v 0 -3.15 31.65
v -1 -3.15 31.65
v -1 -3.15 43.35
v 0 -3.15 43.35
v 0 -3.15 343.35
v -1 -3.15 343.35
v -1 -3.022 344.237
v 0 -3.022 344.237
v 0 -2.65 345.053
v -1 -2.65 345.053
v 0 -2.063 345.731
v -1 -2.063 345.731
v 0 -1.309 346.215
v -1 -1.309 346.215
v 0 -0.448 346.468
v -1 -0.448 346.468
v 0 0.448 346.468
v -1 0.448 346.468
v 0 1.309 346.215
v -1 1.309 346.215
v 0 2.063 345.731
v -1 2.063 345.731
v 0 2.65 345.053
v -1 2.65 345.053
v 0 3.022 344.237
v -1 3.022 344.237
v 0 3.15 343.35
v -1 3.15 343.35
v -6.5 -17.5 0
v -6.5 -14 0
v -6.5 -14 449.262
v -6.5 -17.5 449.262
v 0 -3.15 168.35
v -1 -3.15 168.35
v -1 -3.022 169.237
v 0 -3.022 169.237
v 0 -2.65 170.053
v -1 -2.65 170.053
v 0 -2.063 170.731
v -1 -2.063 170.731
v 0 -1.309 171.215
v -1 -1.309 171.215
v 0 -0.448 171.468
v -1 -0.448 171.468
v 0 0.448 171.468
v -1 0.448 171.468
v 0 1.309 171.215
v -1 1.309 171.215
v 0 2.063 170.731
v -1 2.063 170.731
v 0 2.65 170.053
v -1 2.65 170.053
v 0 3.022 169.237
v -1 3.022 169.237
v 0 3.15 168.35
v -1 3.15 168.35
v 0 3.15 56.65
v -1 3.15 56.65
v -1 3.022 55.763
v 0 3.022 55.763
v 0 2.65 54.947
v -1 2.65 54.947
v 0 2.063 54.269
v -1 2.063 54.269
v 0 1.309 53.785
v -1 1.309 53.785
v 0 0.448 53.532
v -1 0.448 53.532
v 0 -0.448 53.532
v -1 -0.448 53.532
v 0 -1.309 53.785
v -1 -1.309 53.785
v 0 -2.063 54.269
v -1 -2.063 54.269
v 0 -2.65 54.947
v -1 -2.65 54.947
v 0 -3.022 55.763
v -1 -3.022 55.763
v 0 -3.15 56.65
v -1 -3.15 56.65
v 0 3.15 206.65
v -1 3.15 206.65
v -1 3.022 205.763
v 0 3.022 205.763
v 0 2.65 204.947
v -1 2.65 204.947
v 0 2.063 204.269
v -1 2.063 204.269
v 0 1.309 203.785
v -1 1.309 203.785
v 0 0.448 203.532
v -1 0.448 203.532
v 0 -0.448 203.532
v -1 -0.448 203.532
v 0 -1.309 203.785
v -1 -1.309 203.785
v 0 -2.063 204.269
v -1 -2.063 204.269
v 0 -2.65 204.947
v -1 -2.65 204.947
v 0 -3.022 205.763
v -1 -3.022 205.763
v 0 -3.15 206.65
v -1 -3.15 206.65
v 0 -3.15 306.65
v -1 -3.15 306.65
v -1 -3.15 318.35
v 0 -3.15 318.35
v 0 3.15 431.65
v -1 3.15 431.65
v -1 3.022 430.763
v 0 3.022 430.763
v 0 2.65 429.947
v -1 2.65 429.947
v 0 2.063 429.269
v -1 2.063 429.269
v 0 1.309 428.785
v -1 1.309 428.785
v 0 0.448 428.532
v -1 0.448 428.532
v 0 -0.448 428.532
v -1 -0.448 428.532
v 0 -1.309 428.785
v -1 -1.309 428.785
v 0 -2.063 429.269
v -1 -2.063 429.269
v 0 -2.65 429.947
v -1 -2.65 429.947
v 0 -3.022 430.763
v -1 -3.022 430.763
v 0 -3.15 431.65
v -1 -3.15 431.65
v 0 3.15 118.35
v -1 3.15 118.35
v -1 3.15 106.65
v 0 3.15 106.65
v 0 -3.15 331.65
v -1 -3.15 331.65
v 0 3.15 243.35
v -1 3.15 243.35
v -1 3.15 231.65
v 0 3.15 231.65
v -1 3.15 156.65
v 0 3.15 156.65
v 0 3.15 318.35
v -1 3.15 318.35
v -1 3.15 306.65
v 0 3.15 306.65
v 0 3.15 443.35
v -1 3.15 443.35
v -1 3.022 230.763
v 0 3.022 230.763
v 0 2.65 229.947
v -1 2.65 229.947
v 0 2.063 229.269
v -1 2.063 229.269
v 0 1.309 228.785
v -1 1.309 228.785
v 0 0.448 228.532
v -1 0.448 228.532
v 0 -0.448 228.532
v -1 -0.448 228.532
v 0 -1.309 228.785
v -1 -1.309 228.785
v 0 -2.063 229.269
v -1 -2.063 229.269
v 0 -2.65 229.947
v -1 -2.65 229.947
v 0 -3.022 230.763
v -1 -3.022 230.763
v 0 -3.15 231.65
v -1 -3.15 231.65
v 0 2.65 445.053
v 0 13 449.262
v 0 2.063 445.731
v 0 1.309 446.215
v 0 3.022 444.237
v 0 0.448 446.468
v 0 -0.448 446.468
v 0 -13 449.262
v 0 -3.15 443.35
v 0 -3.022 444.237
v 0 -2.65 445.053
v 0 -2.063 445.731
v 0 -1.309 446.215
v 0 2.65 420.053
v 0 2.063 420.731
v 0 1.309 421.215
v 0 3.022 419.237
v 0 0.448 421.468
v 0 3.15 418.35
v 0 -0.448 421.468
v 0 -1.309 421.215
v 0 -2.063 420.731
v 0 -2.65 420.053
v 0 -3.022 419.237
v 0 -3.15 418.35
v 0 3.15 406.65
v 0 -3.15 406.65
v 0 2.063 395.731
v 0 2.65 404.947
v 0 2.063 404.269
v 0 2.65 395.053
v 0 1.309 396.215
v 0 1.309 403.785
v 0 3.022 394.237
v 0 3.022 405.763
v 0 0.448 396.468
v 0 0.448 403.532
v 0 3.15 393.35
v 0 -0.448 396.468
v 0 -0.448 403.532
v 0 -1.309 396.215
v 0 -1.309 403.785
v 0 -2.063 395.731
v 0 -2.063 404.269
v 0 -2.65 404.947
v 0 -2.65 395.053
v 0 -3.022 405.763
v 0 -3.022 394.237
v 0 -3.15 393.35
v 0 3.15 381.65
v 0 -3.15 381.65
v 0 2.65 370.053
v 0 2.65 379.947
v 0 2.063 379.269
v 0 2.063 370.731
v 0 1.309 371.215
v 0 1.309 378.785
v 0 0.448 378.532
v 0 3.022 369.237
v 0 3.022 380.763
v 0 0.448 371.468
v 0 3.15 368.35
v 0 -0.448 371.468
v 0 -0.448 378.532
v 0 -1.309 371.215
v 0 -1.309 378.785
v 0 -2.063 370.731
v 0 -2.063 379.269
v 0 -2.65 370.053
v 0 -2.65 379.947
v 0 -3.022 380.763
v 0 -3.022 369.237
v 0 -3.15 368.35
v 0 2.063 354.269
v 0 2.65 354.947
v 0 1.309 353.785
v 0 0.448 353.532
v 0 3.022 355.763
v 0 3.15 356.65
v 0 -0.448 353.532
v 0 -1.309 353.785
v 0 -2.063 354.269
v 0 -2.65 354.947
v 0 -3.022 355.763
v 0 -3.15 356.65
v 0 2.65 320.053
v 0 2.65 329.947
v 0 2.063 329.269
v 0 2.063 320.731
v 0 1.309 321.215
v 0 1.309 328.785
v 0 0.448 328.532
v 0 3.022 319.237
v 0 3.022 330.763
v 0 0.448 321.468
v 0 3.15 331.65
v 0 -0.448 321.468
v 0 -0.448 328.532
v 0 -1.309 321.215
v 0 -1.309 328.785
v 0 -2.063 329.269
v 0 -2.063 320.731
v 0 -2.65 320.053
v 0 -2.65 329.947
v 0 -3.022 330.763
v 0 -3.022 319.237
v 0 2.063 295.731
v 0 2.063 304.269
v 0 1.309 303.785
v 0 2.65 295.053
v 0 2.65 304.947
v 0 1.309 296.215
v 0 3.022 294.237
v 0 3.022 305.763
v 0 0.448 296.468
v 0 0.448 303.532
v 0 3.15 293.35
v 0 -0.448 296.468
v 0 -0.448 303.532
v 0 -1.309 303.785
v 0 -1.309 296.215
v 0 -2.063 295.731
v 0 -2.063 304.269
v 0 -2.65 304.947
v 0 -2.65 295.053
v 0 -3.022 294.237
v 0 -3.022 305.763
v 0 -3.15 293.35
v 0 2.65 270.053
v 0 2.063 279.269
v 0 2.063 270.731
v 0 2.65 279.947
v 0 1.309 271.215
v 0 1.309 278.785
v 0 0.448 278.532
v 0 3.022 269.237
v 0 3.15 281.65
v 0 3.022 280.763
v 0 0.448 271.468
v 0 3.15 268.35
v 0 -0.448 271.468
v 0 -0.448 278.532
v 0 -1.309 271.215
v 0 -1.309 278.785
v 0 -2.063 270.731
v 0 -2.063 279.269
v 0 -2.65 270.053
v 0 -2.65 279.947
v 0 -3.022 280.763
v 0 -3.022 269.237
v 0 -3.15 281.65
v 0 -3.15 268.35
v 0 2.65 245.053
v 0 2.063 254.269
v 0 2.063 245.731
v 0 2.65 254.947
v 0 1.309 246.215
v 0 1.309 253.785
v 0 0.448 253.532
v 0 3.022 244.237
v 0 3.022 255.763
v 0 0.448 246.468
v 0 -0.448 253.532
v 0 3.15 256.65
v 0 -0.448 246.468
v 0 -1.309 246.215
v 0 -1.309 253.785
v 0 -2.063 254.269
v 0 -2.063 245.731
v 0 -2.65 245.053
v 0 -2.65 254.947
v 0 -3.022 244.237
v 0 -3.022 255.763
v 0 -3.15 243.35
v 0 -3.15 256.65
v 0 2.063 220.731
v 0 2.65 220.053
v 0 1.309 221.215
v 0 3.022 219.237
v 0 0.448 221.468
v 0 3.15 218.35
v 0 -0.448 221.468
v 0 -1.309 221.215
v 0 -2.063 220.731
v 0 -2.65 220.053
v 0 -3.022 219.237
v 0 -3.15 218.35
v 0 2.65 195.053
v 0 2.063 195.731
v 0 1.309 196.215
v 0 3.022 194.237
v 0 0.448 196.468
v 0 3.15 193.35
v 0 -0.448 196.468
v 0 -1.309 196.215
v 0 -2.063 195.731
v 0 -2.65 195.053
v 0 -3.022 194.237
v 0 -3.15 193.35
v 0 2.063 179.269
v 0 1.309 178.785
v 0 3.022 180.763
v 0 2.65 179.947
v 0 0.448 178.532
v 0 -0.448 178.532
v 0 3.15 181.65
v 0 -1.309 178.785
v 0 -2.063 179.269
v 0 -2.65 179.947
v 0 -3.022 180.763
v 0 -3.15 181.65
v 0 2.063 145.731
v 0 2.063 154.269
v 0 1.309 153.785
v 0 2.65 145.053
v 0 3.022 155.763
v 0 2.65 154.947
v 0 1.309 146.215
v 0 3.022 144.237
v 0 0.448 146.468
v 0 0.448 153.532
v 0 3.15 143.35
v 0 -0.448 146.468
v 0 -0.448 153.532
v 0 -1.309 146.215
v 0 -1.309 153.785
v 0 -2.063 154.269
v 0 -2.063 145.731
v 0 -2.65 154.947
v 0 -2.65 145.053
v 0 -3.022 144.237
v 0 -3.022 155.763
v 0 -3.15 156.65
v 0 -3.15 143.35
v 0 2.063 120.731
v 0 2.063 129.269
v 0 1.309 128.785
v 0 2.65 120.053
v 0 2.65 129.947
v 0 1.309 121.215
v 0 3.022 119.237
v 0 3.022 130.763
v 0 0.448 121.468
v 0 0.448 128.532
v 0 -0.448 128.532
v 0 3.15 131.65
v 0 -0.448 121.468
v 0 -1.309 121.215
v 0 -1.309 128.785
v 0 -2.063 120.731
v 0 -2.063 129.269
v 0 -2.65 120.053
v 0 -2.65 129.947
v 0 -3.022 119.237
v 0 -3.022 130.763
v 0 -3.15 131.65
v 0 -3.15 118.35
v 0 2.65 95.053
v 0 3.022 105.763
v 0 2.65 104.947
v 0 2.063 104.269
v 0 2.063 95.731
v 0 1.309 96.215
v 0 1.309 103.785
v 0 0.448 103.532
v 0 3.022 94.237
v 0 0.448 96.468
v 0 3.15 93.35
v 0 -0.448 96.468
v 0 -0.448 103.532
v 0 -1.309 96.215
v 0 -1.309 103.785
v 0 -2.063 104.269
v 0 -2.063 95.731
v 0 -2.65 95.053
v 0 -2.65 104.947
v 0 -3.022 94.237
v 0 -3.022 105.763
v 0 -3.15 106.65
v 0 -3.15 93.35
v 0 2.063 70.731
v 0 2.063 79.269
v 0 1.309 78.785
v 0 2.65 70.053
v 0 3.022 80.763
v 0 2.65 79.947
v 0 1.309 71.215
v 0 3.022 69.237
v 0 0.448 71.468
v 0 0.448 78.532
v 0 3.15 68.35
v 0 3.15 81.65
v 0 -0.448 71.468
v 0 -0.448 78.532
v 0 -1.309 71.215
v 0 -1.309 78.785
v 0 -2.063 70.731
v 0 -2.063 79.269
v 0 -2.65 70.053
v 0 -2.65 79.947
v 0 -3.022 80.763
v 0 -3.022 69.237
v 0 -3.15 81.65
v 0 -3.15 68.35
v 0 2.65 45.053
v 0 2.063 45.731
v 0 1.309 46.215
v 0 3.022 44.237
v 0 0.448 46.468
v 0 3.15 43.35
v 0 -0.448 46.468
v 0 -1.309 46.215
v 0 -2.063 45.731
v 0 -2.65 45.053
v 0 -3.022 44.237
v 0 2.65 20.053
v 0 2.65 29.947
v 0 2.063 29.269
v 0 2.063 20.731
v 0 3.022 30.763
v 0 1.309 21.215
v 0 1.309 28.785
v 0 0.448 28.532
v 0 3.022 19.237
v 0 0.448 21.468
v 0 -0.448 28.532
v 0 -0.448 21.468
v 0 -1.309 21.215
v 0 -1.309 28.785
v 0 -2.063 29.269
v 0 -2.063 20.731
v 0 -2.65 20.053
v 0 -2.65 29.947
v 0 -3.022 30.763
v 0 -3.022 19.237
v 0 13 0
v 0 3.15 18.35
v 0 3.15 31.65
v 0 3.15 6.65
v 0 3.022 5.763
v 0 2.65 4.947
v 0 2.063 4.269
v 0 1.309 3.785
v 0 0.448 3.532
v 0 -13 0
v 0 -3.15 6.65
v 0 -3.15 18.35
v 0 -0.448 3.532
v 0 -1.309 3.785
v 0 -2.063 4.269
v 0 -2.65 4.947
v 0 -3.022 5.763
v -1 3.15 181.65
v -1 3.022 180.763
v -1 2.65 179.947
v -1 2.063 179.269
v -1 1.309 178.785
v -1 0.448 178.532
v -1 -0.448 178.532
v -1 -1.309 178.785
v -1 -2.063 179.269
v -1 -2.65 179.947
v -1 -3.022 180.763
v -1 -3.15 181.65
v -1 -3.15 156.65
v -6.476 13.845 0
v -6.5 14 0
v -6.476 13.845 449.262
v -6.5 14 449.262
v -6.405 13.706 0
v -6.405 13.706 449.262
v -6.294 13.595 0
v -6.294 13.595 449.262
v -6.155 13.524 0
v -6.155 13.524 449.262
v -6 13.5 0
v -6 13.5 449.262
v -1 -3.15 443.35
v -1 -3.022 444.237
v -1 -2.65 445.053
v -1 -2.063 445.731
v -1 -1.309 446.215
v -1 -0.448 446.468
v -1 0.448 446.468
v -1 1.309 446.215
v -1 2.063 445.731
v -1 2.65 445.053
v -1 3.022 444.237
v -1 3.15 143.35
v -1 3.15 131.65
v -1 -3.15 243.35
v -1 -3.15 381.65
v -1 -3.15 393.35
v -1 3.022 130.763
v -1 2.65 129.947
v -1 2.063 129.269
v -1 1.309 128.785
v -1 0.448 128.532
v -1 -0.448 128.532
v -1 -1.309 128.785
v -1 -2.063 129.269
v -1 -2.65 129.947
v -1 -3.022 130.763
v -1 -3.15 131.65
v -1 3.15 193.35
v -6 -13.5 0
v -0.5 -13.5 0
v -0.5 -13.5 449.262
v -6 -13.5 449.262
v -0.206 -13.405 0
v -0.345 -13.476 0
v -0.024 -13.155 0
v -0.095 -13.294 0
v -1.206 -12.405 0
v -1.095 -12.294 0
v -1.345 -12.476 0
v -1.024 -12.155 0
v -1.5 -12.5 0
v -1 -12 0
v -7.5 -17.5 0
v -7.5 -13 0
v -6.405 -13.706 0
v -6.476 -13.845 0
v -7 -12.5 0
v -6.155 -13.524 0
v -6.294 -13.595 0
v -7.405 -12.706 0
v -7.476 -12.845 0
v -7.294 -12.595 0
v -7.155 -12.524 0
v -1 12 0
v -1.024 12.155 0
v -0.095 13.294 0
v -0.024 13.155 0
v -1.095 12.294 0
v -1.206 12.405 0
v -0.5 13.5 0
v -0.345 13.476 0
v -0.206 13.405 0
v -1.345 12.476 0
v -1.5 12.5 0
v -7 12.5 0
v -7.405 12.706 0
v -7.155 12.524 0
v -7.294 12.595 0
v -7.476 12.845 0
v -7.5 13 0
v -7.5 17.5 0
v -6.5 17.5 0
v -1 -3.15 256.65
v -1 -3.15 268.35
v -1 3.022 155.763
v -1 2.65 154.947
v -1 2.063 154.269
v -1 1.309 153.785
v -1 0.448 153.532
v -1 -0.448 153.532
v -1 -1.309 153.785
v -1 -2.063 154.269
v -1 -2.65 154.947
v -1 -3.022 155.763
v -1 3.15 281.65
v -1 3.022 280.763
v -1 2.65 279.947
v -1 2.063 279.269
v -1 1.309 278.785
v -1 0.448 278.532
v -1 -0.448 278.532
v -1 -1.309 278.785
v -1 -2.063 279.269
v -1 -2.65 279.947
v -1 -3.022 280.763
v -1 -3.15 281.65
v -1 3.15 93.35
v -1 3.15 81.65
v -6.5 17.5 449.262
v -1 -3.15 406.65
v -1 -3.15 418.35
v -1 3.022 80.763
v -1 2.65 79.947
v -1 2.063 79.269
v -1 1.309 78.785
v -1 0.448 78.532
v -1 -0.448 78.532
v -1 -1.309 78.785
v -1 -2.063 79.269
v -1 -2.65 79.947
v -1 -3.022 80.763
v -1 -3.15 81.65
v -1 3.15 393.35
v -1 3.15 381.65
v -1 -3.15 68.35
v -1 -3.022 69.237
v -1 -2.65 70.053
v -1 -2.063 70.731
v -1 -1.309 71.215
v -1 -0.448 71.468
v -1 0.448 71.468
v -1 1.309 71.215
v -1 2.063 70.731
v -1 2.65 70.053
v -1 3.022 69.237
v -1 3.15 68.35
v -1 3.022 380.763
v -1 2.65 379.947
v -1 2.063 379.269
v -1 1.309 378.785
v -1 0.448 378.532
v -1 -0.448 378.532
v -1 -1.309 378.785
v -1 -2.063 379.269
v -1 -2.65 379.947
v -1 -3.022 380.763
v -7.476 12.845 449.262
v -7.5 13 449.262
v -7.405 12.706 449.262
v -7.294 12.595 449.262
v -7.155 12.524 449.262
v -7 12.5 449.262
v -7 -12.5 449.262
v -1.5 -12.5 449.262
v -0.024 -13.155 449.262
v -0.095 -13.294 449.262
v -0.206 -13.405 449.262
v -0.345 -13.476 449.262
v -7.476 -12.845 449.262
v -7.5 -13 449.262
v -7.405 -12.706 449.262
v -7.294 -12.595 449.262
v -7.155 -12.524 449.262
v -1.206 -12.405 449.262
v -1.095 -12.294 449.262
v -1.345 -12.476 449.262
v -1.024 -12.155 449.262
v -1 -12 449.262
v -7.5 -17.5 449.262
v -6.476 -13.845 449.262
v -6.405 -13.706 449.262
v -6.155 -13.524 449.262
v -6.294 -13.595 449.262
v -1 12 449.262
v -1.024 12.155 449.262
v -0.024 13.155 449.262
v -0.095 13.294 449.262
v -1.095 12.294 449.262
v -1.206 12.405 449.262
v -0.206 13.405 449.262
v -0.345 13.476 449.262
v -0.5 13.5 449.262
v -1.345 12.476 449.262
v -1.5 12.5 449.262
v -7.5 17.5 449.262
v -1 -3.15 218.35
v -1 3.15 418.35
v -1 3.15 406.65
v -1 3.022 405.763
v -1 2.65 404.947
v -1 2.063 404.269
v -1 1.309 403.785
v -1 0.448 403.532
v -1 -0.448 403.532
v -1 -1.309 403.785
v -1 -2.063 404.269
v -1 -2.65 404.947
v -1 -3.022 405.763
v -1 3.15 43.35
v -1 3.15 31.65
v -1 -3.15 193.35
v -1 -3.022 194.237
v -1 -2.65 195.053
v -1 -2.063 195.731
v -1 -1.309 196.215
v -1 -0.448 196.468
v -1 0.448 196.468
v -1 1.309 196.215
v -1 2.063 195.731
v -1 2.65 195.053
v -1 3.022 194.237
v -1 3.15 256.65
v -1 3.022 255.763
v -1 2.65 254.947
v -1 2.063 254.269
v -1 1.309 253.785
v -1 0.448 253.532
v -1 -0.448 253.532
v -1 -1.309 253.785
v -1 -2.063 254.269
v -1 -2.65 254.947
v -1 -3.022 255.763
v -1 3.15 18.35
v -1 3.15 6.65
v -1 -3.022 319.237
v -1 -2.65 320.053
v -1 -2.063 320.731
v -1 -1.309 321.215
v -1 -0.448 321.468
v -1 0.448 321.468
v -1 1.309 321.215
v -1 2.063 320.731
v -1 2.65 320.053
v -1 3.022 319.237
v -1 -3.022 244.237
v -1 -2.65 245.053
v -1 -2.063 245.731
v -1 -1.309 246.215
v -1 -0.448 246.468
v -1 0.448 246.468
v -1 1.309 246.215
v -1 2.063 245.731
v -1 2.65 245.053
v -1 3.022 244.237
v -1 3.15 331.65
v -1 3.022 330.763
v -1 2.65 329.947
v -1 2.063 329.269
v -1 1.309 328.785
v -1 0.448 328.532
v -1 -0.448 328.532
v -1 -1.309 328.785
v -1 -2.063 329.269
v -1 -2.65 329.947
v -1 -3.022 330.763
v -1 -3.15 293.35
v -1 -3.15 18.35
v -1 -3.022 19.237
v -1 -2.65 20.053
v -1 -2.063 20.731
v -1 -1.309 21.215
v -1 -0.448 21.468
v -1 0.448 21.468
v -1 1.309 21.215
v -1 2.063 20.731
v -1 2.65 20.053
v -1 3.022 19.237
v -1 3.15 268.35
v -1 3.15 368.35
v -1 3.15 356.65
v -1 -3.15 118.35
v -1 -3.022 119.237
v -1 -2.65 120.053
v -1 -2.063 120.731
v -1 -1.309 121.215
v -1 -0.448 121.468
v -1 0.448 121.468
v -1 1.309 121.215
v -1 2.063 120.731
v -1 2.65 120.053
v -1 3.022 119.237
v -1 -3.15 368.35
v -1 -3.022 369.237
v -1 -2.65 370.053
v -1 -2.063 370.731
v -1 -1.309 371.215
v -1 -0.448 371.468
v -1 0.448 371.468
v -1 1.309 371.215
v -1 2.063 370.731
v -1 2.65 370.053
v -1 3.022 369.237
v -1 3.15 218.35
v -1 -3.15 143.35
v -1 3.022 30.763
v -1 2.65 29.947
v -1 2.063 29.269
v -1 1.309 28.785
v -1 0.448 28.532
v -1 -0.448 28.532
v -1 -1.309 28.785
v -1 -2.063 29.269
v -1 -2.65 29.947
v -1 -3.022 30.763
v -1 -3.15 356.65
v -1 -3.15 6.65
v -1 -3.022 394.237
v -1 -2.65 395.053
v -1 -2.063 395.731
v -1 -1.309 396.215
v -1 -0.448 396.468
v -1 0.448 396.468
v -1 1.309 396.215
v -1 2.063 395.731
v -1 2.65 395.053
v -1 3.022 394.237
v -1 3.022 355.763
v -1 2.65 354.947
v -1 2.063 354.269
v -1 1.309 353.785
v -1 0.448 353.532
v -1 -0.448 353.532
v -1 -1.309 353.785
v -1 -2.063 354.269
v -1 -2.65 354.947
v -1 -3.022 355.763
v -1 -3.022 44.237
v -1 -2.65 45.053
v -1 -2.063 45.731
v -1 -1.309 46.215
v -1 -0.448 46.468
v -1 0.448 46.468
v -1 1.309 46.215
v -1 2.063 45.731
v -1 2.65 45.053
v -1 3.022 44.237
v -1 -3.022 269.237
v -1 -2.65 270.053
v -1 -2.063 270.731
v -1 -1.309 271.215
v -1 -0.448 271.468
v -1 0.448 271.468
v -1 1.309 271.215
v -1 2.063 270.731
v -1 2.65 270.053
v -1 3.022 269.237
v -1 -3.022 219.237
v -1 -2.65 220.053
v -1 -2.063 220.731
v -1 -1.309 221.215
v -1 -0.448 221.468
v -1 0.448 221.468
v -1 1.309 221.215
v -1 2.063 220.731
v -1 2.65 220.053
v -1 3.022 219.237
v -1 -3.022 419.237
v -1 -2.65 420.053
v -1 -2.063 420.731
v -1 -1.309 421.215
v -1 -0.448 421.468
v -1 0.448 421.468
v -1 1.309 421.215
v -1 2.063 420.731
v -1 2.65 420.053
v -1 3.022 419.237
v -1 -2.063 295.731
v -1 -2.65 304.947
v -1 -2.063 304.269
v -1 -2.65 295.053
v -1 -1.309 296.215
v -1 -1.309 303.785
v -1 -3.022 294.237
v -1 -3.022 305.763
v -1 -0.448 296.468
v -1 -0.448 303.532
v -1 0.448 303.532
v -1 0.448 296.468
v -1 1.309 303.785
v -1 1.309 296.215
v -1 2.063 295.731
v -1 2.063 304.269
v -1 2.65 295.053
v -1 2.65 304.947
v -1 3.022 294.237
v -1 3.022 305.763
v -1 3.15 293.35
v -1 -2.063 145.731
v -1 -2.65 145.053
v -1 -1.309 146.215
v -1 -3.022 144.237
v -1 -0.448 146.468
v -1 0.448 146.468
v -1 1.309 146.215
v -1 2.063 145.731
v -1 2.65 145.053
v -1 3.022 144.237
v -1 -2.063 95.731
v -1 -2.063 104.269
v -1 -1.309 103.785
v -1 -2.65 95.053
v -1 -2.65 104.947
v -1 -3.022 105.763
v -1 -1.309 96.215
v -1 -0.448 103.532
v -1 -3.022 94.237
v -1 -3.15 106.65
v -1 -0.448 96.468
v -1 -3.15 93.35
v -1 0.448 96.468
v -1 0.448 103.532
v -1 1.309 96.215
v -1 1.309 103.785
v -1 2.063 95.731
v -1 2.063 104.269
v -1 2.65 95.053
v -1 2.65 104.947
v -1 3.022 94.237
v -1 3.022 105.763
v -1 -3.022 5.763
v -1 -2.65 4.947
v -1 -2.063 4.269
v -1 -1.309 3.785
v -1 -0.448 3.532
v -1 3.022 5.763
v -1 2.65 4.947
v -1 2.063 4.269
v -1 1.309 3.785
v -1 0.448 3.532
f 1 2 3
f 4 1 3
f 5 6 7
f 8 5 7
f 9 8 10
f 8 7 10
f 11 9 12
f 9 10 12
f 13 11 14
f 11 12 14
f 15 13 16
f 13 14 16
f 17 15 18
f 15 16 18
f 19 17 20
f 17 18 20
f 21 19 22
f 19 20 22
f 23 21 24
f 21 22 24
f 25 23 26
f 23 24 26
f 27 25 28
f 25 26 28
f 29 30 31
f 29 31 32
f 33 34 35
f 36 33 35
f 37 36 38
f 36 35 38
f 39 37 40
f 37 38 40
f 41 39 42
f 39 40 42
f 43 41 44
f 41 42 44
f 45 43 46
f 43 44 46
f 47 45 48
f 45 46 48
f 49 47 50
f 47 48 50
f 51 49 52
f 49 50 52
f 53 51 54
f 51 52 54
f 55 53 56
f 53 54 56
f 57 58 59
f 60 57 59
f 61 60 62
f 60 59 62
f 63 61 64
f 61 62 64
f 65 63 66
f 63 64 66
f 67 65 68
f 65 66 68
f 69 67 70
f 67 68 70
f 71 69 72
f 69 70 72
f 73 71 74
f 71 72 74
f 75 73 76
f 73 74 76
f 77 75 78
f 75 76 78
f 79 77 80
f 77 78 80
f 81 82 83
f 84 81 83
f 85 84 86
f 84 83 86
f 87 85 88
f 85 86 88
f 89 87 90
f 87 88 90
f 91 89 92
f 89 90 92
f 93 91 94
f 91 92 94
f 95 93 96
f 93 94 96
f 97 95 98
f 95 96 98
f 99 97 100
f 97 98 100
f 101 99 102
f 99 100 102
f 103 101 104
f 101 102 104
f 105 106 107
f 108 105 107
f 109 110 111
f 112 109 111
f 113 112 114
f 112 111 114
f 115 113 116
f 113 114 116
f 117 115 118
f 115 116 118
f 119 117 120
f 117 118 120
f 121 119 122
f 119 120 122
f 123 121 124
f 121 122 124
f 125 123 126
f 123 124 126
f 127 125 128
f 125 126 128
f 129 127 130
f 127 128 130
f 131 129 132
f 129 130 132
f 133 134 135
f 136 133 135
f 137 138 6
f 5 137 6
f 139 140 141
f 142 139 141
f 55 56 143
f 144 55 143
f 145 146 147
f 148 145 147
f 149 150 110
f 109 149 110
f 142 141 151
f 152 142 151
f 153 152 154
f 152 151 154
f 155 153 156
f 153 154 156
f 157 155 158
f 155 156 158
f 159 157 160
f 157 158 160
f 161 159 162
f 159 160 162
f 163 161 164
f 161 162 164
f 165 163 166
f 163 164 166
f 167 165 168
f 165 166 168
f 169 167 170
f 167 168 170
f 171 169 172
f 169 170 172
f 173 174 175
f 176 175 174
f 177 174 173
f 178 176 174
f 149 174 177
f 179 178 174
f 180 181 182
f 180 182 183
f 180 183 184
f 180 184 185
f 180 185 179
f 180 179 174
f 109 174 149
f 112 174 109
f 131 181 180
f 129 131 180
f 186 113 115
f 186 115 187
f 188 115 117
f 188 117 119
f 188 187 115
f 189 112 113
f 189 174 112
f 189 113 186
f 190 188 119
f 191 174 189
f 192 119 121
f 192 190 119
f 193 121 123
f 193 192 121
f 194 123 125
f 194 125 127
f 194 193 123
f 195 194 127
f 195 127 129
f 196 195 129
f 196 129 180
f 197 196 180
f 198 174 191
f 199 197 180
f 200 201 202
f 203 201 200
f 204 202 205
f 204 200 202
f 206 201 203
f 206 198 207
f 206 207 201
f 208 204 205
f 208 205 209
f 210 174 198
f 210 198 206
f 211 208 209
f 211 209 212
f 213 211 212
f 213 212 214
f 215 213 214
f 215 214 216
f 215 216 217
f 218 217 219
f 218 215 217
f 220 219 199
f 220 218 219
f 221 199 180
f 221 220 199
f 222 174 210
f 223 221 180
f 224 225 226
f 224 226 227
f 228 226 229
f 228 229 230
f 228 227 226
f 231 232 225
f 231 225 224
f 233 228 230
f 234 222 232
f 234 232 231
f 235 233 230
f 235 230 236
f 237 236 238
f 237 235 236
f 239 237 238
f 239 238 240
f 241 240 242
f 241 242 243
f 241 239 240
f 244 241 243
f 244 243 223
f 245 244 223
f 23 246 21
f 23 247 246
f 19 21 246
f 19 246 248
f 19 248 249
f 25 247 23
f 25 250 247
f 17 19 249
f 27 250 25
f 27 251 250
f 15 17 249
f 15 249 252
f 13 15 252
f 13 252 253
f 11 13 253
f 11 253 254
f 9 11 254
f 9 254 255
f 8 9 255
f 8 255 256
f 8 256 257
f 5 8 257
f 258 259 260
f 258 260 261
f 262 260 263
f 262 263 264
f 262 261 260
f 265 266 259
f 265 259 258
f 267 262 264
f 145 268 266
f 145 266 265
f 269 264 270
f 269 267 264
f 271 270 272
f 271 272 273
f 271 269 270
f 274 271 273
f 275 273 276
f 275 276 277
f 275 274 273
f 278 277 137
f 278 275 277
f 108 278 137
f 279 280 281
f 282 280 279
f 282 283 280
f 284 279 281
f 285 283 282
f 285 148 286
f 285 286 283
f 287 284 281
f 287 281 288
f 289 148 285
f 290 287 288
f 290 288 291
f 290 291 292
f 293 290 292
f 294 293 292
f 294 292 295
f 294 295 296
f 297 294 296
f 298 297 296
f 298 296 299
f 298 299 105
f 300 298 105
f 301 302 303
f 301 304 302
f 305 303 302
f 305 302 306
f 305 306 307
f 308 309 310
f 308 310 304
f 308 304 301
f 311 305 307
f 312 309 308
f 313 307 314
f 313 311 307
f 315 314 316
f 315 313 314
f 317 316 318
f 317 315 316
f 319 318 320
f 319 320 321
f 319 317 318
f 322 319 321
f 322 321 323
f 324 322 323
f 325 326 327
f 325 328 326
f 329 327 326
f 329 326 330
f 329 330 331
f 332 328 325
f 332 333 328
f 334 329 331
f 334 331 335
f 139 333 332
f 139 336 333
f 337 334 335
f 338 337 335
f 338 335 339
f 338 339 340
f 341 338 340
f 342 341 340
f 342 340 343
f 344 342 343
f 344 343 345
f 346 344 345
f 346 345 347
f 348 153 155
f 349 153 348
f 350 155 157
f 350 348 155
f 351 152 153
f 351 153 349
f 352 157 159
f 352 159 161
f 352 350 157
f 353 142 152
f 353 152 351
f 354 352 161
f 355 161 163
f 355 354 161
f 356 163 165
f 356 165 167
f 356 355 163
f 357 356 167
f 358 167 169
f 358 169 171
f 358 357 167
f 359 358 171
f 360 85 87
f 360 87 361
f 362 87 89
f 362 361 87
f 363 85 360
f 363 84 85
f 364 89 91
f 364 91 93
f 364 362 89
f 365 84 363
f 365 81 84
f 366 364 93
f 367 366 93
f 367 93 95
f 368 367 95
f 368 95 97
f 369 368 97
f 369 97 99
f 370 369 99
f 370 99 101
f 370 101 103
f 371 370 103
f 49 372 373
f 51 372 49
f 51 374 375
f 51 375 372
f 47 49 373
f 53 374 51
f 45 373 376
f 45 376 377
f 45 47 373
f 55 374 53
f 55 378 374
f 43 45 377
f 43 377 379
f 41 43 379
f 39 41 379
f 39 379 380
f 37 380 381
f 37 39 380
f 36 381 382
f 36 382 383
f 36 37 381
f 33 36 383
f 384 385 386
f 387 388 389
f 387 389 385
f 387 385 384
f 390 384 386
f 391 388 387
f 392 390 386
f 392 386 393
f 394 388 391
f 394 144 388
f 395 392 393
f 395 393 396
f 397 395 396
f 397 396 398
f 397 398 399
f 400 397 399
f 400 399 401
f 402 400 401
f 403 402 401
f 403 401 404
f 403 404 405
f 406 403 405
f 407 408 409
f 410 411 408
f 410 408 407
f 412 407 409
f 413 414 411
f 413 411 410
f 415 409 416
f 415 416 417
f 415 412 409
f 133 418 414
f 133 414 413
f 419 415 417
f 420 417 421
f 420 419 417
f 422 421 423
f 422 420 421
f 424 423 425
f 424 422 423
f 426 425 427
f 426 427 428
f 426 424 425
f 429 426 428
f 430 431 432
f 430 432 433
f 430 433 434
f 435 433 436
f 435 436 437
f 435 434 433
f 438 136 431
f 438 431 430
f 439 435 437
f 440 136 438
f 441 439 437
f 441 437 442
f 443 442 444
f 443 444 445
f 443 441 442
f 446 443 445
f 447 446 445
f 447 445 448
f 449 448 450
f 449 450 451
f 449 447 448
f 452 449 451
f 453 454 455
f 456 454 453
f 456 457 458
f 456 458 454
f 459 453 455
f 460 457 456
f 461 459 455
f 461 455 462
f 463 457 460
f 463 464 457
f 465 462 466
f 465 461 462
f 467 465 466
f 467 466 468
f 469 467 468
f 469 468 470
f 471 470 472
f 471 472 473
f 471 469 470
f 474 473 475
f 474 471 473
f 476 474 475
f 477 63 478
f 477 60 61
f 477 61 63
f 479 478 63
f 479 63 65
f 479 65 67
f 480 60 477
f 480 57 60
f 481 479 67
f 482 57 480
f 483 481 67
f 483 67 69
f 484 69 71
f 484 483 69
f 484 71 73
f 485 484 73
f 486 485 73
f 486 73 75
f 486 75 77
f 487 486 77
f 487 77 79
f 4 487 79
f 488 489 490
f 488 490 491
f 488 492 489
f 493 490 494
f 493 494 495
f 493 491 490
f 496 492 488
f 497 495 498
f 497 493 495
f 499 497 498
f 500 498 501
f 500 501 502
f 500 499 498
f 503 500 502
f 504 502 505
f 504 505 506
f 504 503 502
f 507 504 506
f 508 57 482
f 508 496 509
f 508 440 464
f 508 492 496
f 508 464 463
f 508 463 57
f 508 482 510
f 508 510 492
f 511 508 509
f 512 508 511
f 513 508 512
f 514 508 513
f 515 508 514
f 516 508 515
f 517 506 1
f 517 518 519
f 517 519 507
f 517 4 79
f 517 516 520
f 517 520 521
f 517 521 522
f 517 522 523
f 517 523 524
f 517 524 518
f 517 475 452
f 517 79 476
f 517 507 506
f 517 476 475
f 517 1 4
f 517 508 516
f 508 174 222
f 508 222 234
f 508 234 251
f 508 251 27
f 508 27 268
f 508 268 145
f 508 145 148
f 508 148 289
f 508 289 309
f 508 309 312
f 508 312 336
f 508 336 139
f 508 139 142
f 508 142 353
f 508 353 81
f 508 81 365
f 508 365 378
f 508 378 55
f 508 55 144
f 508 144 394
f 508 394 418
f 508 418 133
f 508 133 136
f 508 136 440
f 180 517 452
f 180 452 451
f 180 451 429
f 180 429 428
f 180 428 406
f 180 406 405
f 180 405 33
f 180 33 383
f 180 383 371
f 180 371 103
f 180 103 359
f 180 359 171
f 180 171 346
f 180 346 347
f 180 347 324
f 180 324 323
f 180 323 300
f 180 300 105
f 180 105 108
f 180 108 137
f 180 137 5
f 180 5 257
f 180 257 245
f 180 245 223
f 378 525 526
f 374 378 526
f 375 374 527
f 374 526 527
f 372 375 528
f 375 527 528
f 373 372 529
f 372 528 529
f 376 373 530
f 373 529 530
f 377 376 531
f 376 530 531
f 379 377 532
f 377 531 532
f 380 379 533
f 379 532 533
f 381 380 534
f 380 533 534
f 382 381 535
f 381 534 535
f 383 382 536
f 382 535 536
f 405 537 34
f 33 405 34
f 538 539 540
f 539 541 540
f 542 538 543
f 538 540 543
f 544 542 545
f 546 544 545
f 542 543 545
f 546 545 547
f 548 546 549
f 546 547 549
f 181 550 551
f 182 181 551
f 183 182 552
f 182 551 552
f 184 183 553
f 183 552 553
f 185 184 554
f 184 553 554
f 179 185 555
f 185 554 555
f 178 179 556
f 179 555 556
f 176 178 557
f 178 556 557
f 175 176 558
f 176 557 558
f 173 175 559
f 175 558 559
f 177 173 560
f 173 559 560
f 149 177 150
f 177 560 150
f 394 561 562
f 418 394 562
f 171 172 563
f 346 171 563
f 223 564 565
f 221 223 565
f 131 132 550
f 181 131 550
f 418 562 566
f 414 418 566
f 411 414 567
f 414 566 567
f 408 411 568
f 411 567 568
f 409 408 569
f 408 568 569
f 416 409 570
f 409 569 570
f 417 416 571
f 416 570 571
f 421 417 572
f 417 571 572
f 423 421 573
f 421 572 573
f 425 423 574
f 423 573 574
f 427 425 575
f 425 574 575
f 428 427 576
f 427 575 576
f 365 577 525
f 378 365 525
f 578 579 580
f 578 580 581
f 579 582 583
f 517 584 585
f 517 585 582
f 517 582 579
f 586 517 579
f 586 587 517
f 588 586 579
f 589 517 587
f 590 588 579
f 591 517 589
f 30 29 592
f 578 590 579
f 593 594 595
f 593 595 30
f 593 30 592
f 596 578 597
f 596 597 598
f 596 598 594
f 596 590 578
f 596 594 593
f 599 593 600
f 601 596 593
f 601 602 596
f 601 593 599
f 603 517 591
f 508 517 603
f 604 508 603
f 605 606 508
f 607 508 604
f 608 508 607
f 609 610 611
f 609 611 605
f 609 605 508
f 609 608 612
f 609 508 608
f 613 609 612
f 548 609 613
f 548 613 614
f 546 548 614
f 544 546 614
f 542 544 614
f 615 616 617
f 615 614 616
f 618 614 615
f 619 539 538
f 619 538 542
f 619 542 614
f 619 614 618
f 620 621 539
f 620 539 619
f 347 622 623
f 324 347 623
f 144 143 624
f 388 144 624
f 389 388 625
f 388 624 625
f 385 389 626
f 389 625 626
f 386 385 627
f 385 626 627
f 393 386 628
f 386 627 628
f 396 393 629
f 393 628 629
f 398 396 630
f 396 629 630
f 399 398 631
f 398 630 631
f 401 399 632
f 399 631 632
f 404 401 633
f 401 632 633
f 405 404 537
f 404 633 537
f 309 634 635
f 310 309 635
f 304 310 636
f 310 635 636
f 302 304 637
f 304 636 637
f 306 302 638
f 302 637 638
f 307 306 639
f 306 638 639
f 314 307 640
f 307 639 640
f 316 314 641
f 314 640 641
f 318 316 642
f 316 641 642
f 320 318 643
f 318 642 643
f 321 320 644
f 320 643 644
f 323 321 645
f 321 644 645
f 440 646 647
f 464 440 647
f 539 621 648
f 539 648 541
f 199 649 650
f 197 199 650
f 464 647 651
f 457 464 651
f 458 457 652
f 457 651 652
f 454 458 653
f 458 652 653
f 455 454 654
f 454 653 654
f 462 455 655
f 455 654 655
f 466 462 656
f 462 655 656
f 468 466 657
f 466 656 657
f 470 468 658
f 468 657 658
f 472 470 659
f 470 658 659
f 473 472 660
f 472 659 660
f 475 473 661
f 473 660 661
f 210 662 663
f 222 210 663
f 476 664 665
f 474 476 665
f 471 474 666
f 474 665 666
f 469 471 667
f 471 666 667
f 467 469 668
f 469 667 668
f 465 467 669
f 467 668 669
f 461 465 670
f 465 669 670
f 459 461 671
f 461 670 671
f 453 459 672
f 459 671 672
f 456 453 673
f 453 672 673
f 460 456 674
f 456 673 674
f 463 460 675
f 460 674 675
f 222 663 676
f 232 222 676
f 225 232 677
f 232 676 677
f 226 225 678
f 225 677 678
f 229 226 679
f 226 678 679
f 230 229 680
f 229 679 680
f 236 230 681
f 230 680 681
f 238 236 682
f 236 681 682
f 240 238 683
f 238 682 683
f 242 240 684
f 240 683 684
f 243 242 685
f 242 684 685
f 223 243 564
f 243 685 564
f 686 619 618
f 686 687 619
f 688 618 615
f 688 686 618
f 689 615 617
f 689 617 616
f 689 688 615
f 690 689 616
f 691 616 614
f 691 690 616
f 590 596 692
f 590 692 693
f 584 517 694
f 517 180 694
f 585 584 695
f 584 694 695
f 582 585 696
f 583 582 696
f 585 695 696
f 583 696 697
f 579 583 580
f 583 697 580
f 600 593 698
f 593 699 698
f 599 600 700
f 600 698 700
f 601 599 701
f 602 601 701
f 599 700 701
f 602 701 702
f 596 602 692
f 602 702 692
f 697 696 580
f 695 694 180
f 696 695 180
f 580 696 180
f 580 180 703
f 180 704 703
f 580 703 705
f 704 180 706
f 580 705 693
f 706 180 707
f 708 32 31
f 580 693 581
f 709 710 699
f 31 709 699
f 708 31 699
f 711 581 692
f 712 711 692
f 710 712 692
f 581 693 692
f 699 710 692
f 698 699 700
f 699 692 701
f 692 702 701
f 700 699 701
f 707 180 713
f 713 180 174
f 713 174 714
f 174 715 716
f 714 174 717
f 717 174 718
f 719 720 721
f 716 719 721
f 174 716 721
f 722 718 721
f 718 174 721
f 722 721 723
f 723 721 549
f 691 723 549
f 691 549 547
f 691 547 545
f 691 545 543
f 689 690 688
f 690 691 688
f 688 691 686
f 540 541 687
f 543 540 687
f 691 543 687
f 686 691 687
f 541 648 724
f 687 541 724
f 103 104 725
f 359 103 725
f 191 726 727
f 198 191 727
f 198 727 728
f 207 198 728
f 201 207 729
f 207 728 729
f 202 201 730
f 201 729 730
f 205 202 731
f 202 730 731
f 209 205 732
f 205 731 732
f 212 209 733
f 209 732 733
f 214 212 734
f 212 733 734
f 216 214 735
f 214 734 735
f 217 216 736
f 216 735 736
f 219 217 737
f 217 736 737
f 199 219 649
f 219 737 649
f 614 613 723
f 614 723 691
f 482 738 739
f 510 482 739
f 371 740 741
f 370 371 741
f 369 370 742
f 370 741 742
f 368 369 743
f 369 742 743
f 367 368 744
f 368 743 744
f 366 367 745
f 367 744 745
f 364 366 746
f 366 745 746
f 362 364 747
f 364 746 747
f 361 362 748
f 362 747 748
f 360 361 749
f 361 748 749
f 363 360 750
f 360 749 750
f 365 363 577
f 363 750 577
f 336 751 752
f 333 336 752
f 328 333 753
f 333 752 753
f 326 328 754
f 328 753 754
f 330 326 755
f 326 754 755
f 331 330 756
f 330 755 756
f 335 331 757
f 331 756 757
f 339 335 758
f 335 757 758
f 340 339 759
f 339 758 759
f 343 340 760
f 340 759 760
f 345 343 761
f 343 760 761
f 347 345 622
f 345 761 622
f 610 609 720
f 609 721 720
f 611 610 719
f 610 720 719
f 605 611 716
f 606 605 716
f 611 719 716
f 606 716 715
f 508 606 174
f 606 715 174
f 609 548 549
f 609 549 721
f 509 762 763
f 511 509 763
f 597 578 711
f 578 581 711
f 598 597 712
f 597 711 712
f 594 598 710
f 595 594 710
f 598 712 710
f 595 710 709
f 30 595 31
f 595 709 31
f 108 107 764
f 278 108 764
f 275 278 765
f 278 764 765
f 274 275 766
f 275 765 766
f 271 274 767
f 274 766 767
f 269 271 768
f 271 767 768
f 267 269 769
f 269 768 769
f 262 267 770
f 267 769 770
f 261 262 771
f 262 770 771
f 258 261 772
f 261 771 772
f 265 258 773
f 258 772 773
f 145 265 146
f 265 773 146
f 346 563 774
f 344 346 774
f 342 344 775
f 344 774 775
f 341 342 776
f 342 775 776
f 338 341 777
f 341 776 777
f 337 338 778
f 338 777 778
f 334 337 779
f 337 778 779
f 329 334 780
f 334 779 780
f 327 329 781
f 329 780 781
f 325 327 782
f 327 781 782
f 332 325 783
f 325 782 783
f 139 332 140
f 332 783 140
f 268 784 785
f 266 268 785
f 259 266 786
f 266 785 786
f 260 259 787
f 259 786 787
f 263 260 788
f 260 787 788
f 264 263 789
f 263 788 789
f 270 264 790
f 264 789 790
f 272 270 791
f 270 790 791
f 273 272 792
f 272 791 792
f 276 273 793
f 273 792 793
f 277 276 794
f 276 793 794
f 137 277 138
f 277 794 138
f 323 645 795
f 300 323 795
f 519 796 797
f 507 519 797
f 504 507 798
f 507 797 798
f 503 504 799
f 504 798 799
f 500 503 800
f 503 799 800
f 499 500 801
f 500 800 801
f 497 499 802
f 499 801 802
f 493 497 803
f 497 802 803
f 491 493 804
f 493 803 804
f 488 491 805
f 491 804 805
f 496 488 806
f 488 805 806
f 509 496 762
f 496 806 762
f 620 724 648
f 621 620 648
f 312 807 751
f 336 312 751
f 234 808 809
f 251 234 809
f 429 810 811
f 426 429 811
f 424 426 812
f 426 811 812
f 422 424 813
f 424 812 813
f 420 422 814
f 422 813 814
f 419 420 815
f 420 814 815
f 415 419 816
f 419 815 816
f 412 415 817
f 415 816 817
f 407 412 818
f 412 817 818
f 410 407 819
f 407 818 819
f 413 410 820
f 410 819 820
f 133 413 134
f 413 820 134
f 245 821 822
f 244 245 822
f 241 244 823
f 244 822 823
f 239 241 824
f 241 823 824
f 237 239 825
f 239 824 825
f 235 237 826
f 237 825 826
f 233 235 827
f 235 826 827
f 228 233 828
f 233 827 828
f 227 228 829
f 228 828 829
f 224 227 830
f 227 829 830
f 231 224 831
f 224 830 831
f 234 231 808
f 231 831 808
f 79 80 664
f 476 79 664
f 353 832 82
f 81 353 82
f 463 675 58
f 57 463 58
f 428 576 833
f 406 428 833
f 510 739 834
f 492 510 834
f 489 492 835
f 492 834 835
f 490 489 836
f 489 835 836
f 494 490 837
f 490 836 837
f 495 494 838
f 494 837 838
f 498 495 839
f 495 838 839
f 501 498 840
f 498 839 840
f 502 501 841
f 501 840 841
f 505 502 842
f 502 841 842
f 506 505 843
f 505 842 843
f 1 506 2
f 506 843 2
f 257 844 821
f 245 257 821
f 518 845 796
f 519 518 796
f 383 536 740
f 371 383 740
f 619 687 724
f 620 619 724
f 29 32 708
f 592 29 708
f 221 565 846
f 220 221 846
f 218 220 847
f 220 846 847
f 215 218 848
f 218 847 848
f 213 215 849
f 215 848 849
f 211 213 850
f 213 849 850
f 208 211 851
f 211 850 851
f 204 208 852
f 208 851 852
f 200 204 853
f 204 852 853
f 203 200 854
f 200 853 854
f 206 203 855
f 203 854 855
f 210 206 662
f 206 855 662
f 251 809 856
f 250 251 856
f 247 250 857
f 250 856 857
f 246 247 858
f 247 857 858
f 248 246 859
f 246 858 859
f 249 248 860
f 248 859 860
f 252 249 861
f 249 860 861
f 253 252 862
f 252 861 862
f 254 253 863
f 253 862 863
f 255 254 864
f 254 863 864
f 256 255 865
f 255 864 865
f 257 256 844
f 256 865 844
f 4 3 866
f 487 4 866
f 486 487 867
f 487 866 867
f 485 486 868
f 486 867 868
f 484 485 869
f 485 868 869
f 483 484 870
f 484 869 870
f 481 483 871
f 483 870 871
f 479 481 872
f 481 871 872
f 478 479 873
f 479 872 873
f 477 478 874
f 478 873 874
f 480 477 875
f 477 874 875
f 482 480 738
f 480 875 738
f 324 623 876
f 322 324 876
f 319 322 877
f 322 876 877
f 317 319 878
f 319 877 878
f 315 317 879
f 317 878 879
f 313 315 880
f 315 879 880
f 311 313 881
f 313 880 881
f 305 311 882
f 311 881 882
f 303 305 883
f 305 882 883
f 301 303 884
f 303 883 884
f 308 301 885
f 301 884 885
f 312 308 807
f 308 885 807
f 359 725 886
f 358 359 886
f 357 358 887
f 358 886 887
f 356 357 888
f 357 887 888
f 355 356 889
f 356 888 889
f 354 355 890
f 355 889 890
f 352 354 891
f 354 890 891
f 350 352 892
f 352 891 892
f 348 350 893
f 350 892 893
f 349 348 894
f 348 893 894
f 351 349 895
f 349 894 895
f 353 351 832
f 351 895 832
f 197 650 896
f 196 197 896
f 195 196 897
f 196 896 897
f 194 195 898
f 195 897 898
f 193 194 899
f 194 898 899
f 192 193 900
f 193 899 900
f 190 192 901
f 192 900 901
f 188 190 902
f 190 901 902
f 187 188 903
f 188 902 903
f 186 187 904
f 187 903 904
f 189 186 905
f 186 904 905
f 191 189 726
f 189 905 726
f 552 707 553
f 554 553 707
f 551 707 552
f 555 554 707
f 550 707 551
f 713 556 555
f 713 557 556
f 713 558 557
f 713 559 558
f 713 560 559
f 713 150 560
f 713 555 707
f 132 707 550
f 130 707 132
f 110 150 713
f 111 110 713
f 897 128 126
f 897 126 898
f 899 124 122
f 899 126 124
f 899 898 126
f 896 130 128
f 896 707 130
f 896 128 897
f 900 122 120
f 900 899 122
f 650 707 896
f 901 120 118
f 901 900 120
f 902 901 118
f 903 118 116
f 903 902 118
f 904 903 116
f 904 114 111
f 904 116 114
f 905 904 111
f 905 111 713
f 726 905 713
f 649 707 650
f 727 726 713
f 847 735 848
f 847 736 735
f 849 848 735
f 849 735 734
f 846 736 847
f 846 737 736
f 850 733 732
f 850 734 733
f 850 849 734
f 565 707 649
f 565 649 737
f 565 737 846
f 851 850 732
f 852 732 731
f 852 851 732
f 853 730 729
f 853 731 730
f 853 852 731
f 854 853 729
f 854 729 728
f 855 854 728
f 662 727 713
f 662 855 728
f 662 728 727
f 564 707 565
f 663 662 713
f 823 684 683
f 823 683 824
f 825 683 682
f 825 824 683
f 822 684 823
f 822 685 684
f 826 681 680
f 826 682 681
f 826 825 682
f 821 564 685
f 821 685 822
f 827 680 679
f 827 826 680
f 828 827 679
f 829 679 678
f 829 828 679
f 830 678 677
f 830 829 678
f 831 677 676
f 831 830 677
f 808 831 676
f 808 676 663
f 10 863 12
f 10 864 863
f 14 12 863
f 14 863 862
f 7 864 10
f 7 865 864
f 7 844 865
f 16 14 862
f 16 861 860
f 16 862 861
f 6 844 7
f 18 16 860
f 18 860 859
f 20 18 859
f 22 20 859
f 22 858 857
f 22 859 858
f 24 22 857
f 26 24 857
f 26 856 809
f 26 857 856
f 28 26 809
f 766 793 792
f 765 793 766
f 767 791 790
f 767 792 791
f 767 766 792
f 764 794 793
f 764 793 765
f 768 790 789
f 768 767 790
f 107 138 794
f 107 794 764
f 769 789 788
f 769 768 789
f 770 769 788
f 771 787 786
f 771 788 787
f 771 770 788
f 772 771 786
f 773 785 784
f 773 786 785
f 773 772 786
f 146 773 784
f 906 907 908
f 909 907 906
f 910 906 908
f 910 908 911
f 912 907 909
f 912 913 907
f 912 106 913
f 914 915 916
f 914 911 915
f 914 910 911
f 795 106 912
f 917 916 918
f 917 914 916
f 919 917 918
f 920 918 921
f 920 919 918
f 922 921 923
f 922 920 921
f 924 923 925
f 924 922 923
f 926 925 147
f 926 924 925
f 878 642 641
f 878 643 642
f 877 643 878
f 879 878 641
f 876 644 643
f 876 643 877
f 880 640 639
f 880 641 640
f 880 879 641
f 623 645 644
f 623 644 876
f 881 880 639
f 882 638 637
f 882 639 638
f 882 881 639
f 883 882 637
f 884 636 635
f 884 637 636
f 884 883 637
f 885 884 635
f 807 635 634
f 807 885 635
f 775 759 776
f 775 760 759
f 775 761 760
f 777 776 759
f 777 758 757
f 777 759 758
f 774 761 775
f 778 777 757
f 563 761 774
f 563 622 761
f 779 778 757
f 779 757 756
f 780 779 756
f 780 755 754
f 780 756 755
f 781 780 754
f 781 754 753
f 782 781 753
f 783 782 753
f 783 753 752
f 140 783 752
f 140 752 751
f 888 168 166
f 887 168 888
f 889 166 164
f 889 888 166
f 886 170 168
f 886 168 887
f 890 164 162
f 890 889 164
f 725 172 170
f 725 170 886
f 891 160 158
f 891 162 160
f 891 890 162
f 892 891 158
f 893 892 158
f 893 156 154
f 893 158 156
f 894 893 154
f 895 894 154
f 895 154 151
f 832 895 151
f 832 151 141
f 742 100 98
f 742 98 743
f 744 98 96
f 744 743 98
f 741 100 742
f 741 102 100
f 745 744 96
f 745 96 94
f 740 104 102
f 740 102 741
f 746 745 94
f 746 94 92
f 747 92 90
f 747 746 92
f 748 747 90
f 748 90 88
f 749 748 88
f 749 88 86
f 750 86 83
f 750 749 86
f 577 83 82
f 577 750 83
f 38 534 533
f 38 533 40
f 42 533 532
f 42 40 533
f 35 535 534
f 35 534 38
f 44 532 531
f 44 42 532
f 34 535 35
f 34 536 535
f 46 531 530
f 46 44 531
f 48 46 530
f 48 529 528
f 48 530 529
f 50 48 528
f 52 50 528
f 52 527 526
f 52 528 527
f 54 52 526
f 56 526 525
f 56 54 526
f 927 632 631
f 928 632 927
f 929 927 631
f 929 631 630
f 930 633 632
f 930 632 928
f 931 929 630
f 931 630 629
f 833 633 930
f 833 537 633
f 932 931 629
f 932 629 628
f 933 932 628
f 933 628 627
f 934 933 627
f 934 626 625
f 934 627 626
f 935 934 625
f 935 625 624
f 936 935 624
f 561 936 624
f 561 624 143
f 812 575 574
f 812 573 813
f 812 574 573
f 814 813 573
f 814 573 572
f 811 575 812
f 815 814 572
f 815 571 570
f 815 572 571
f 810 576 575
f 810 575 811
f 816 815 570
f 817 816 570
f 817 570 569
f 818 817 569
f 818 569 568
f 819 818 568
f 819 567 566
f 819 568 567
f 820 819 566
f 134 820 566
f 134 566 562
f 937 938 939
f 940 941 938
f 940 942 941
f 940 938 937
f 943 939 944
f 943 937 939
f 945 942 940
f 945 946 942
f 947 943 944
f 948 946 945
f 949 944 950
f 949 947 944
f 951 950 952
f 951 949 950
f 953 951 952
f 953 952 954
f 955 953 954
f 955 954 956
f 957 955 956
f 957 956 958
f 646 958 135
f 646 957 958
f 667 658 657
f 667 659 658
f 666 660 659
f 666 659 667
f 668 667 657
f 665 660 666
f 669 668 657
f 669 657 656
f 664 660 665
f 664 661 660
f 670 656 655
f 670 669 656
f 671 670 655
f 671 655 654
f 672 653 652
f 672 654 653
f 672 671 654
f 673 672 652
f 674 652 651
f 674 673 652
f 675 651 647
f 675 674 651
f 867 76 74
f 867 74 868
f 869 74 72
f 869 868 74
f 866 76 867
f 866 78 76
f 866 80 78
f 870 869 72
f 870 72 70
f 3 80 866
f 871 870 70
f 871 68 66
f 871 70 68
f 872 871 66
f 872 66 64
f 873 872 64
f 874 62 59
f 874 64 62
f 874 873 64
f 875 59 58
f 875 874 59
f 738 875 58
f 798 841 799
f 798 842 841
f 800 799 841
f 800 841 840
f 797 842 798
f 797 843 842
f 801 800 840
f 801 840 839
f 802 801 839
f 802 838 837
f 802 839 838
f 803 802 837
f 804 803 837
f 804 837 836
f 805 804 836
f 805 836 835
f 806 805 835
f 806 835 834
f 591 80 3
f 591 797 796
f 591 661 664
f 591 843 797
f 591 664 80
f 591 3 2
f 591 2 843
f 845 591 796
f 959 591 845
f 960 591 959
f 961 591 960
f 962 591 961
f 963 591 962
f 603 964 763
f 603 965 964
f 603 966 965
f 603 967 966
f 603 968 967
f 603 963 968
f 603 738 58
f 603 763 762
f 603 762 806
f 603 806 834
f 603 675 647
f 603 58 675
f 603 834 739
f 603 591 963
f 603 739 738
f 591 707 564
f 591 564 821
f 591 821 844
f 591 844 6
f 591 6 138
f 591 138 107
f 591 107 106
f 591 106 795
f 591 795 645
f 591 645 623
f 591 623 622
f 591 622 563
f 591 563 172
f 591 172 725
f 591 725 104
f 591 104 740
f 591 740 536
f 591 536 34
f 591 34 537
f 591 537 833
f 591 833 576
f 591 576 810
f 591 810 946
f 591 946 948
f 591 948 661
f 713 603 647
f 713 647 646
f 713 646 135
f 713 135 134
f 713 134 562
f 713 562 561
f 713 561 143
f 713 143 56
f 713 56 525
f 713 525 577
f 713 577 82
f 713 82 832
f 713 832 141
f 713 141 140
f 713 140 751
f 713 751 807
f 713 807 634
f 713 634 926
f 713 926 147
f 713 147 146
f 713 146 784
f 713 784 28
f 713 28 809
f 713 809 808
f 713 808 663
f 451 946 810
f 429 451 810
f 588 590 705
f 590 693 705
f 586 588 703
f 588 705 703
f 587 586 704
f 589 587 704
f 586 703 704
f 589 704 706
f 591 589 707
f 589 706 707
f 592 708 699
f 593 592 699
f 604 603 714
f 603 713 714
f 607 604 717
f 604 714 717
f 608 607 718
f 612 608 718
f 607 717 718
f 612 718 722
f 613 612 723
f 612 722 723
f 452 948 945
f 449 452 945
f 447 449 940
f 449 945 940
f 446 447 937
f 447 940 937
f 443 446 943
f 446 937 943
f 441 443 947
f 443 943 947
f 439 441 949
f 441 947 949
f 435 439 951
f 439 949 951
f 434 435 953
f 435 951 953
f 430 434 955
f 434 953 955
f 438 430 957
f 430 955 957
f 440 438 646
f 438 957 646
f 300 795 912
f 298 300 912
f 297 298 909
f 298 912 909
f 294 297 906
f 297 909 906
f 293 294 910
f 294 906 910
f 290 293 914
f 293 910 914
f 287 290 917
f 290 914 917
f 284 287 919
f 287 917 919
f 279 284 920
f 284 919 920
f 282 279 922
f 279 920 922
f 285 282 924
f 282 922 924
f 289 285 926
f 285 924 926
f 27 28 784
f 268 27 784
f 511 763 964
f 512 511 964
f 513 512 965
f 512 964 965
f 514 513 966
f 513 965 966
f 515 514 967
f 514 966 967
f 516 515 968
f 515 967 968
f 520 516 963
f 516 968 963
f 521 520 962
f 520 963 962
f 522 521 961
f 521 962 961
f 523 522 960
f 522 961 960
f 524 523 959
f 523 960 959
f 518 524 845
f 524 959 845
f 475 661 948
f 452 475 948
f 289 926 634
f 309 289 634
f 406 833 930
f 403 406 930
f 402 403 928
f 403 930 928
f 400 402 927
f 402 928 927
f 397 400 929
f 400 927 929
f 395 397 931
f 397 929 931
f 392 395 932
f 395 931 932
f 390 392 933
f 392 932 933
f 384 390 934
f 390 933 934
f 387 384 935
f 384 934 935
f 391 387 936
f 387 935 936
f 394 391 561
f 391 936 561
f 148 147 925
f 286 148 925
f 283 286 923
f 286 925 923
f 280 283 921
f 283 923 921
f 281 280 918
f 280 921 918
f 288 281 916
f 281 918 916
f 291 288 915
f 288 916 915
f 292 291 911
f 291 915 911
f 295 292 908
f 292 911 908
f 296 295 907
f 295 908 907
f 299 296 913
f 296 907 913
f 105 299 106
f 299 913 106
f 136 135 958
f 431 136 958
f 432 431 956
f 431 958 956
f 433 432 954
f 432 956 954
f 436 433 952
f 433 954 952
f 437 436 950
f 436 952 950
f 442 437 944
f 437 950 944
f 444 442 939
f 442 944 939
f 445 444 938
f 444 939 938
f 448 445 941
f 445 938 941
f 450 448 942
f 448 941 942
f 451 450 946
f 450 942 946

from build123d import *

# Parameters (mm, degrees)
EXTRUDE_THIN1_DEPTH = 449.2625
CUT_EXTRUDE1_START  = -8.5
CUT_EXTRUDE1_DEPTH  = 9.5
LPATTERN1_COUNT     = 18
LPATTERN1_PITCH     = 25
FILLET1_R           = 0.5


with BuildPart() as part:
    # Sketch3 → Extrude-Thin1 (new body)
    with BuildSketch(Plane.XY):
        Polygon((-6.5, 17.5), (-6.5, 13.5), (0, 13.5), (0, -13.5), (-6.5, -13.5), (-6.5, -17.5), (-7.5, -17.5), (-7.5, -12.5), (-1, -12.5), (-1, 12.5), (-7.5, 12.5), (-7.5, 17.5), align=None)
    extrude(amount=EXTRUDE_THIN1_DEPTH)

    # Sketch4 → Cut-Extrude1 (cut)
    with BuildSketch(Plane(origin=(0, 0, 0), x_dir=(0, 0, -1), z_dir=(1, 0, 0)).offset(CUT_EXTRUDE1_START)):
        with BuildLine():
            Line((-6.65, -3.15), (-18.35, -3.15))
            ThreePointArc((-18.35, -3.15), (-21.5, 0), (-18.35, 3.15))
            Line((-18.35, 3.15), (-6.65, 3.15))
            ThreePointArc((-6.65, 3.15), (-3.5, 0), (-6.65, -3.15))
        make_face()
    cut_extrude1 = extrude(amount=CUT_EXTRUDE1_DEPTH, mode=Mode.SUBTRACT)

    # LPattern1: Cut-Extrude1 ×18
    with Locations(*[(0, 0, i * LPATTERN1_PITCH) for i in range(1, LPATTERN1_COUNT)]):
        add(cut_extrude1, mode=Mode.SUBTRACT)

    # Fillet1
    fillet1_edges = [part.edges().sort_by_distance(p)[0] for p in [
        (-6.5, 13.5, 224.63125),
        (0, 13.5, 224.63125),
        (0, -13.5, 224.63125),
        (-6.5, -13.5, 224.63125),
        (-7.5, -12.5, 224.63125),
        (-1, -12.5, 224.63125),
        (-1, 12.5, 224.63125),
        (-7.5, 12.5, 224.63125),
    ]]
    fillet(fillet1_edges, radius=FILLET1_R)


solid = part.part
